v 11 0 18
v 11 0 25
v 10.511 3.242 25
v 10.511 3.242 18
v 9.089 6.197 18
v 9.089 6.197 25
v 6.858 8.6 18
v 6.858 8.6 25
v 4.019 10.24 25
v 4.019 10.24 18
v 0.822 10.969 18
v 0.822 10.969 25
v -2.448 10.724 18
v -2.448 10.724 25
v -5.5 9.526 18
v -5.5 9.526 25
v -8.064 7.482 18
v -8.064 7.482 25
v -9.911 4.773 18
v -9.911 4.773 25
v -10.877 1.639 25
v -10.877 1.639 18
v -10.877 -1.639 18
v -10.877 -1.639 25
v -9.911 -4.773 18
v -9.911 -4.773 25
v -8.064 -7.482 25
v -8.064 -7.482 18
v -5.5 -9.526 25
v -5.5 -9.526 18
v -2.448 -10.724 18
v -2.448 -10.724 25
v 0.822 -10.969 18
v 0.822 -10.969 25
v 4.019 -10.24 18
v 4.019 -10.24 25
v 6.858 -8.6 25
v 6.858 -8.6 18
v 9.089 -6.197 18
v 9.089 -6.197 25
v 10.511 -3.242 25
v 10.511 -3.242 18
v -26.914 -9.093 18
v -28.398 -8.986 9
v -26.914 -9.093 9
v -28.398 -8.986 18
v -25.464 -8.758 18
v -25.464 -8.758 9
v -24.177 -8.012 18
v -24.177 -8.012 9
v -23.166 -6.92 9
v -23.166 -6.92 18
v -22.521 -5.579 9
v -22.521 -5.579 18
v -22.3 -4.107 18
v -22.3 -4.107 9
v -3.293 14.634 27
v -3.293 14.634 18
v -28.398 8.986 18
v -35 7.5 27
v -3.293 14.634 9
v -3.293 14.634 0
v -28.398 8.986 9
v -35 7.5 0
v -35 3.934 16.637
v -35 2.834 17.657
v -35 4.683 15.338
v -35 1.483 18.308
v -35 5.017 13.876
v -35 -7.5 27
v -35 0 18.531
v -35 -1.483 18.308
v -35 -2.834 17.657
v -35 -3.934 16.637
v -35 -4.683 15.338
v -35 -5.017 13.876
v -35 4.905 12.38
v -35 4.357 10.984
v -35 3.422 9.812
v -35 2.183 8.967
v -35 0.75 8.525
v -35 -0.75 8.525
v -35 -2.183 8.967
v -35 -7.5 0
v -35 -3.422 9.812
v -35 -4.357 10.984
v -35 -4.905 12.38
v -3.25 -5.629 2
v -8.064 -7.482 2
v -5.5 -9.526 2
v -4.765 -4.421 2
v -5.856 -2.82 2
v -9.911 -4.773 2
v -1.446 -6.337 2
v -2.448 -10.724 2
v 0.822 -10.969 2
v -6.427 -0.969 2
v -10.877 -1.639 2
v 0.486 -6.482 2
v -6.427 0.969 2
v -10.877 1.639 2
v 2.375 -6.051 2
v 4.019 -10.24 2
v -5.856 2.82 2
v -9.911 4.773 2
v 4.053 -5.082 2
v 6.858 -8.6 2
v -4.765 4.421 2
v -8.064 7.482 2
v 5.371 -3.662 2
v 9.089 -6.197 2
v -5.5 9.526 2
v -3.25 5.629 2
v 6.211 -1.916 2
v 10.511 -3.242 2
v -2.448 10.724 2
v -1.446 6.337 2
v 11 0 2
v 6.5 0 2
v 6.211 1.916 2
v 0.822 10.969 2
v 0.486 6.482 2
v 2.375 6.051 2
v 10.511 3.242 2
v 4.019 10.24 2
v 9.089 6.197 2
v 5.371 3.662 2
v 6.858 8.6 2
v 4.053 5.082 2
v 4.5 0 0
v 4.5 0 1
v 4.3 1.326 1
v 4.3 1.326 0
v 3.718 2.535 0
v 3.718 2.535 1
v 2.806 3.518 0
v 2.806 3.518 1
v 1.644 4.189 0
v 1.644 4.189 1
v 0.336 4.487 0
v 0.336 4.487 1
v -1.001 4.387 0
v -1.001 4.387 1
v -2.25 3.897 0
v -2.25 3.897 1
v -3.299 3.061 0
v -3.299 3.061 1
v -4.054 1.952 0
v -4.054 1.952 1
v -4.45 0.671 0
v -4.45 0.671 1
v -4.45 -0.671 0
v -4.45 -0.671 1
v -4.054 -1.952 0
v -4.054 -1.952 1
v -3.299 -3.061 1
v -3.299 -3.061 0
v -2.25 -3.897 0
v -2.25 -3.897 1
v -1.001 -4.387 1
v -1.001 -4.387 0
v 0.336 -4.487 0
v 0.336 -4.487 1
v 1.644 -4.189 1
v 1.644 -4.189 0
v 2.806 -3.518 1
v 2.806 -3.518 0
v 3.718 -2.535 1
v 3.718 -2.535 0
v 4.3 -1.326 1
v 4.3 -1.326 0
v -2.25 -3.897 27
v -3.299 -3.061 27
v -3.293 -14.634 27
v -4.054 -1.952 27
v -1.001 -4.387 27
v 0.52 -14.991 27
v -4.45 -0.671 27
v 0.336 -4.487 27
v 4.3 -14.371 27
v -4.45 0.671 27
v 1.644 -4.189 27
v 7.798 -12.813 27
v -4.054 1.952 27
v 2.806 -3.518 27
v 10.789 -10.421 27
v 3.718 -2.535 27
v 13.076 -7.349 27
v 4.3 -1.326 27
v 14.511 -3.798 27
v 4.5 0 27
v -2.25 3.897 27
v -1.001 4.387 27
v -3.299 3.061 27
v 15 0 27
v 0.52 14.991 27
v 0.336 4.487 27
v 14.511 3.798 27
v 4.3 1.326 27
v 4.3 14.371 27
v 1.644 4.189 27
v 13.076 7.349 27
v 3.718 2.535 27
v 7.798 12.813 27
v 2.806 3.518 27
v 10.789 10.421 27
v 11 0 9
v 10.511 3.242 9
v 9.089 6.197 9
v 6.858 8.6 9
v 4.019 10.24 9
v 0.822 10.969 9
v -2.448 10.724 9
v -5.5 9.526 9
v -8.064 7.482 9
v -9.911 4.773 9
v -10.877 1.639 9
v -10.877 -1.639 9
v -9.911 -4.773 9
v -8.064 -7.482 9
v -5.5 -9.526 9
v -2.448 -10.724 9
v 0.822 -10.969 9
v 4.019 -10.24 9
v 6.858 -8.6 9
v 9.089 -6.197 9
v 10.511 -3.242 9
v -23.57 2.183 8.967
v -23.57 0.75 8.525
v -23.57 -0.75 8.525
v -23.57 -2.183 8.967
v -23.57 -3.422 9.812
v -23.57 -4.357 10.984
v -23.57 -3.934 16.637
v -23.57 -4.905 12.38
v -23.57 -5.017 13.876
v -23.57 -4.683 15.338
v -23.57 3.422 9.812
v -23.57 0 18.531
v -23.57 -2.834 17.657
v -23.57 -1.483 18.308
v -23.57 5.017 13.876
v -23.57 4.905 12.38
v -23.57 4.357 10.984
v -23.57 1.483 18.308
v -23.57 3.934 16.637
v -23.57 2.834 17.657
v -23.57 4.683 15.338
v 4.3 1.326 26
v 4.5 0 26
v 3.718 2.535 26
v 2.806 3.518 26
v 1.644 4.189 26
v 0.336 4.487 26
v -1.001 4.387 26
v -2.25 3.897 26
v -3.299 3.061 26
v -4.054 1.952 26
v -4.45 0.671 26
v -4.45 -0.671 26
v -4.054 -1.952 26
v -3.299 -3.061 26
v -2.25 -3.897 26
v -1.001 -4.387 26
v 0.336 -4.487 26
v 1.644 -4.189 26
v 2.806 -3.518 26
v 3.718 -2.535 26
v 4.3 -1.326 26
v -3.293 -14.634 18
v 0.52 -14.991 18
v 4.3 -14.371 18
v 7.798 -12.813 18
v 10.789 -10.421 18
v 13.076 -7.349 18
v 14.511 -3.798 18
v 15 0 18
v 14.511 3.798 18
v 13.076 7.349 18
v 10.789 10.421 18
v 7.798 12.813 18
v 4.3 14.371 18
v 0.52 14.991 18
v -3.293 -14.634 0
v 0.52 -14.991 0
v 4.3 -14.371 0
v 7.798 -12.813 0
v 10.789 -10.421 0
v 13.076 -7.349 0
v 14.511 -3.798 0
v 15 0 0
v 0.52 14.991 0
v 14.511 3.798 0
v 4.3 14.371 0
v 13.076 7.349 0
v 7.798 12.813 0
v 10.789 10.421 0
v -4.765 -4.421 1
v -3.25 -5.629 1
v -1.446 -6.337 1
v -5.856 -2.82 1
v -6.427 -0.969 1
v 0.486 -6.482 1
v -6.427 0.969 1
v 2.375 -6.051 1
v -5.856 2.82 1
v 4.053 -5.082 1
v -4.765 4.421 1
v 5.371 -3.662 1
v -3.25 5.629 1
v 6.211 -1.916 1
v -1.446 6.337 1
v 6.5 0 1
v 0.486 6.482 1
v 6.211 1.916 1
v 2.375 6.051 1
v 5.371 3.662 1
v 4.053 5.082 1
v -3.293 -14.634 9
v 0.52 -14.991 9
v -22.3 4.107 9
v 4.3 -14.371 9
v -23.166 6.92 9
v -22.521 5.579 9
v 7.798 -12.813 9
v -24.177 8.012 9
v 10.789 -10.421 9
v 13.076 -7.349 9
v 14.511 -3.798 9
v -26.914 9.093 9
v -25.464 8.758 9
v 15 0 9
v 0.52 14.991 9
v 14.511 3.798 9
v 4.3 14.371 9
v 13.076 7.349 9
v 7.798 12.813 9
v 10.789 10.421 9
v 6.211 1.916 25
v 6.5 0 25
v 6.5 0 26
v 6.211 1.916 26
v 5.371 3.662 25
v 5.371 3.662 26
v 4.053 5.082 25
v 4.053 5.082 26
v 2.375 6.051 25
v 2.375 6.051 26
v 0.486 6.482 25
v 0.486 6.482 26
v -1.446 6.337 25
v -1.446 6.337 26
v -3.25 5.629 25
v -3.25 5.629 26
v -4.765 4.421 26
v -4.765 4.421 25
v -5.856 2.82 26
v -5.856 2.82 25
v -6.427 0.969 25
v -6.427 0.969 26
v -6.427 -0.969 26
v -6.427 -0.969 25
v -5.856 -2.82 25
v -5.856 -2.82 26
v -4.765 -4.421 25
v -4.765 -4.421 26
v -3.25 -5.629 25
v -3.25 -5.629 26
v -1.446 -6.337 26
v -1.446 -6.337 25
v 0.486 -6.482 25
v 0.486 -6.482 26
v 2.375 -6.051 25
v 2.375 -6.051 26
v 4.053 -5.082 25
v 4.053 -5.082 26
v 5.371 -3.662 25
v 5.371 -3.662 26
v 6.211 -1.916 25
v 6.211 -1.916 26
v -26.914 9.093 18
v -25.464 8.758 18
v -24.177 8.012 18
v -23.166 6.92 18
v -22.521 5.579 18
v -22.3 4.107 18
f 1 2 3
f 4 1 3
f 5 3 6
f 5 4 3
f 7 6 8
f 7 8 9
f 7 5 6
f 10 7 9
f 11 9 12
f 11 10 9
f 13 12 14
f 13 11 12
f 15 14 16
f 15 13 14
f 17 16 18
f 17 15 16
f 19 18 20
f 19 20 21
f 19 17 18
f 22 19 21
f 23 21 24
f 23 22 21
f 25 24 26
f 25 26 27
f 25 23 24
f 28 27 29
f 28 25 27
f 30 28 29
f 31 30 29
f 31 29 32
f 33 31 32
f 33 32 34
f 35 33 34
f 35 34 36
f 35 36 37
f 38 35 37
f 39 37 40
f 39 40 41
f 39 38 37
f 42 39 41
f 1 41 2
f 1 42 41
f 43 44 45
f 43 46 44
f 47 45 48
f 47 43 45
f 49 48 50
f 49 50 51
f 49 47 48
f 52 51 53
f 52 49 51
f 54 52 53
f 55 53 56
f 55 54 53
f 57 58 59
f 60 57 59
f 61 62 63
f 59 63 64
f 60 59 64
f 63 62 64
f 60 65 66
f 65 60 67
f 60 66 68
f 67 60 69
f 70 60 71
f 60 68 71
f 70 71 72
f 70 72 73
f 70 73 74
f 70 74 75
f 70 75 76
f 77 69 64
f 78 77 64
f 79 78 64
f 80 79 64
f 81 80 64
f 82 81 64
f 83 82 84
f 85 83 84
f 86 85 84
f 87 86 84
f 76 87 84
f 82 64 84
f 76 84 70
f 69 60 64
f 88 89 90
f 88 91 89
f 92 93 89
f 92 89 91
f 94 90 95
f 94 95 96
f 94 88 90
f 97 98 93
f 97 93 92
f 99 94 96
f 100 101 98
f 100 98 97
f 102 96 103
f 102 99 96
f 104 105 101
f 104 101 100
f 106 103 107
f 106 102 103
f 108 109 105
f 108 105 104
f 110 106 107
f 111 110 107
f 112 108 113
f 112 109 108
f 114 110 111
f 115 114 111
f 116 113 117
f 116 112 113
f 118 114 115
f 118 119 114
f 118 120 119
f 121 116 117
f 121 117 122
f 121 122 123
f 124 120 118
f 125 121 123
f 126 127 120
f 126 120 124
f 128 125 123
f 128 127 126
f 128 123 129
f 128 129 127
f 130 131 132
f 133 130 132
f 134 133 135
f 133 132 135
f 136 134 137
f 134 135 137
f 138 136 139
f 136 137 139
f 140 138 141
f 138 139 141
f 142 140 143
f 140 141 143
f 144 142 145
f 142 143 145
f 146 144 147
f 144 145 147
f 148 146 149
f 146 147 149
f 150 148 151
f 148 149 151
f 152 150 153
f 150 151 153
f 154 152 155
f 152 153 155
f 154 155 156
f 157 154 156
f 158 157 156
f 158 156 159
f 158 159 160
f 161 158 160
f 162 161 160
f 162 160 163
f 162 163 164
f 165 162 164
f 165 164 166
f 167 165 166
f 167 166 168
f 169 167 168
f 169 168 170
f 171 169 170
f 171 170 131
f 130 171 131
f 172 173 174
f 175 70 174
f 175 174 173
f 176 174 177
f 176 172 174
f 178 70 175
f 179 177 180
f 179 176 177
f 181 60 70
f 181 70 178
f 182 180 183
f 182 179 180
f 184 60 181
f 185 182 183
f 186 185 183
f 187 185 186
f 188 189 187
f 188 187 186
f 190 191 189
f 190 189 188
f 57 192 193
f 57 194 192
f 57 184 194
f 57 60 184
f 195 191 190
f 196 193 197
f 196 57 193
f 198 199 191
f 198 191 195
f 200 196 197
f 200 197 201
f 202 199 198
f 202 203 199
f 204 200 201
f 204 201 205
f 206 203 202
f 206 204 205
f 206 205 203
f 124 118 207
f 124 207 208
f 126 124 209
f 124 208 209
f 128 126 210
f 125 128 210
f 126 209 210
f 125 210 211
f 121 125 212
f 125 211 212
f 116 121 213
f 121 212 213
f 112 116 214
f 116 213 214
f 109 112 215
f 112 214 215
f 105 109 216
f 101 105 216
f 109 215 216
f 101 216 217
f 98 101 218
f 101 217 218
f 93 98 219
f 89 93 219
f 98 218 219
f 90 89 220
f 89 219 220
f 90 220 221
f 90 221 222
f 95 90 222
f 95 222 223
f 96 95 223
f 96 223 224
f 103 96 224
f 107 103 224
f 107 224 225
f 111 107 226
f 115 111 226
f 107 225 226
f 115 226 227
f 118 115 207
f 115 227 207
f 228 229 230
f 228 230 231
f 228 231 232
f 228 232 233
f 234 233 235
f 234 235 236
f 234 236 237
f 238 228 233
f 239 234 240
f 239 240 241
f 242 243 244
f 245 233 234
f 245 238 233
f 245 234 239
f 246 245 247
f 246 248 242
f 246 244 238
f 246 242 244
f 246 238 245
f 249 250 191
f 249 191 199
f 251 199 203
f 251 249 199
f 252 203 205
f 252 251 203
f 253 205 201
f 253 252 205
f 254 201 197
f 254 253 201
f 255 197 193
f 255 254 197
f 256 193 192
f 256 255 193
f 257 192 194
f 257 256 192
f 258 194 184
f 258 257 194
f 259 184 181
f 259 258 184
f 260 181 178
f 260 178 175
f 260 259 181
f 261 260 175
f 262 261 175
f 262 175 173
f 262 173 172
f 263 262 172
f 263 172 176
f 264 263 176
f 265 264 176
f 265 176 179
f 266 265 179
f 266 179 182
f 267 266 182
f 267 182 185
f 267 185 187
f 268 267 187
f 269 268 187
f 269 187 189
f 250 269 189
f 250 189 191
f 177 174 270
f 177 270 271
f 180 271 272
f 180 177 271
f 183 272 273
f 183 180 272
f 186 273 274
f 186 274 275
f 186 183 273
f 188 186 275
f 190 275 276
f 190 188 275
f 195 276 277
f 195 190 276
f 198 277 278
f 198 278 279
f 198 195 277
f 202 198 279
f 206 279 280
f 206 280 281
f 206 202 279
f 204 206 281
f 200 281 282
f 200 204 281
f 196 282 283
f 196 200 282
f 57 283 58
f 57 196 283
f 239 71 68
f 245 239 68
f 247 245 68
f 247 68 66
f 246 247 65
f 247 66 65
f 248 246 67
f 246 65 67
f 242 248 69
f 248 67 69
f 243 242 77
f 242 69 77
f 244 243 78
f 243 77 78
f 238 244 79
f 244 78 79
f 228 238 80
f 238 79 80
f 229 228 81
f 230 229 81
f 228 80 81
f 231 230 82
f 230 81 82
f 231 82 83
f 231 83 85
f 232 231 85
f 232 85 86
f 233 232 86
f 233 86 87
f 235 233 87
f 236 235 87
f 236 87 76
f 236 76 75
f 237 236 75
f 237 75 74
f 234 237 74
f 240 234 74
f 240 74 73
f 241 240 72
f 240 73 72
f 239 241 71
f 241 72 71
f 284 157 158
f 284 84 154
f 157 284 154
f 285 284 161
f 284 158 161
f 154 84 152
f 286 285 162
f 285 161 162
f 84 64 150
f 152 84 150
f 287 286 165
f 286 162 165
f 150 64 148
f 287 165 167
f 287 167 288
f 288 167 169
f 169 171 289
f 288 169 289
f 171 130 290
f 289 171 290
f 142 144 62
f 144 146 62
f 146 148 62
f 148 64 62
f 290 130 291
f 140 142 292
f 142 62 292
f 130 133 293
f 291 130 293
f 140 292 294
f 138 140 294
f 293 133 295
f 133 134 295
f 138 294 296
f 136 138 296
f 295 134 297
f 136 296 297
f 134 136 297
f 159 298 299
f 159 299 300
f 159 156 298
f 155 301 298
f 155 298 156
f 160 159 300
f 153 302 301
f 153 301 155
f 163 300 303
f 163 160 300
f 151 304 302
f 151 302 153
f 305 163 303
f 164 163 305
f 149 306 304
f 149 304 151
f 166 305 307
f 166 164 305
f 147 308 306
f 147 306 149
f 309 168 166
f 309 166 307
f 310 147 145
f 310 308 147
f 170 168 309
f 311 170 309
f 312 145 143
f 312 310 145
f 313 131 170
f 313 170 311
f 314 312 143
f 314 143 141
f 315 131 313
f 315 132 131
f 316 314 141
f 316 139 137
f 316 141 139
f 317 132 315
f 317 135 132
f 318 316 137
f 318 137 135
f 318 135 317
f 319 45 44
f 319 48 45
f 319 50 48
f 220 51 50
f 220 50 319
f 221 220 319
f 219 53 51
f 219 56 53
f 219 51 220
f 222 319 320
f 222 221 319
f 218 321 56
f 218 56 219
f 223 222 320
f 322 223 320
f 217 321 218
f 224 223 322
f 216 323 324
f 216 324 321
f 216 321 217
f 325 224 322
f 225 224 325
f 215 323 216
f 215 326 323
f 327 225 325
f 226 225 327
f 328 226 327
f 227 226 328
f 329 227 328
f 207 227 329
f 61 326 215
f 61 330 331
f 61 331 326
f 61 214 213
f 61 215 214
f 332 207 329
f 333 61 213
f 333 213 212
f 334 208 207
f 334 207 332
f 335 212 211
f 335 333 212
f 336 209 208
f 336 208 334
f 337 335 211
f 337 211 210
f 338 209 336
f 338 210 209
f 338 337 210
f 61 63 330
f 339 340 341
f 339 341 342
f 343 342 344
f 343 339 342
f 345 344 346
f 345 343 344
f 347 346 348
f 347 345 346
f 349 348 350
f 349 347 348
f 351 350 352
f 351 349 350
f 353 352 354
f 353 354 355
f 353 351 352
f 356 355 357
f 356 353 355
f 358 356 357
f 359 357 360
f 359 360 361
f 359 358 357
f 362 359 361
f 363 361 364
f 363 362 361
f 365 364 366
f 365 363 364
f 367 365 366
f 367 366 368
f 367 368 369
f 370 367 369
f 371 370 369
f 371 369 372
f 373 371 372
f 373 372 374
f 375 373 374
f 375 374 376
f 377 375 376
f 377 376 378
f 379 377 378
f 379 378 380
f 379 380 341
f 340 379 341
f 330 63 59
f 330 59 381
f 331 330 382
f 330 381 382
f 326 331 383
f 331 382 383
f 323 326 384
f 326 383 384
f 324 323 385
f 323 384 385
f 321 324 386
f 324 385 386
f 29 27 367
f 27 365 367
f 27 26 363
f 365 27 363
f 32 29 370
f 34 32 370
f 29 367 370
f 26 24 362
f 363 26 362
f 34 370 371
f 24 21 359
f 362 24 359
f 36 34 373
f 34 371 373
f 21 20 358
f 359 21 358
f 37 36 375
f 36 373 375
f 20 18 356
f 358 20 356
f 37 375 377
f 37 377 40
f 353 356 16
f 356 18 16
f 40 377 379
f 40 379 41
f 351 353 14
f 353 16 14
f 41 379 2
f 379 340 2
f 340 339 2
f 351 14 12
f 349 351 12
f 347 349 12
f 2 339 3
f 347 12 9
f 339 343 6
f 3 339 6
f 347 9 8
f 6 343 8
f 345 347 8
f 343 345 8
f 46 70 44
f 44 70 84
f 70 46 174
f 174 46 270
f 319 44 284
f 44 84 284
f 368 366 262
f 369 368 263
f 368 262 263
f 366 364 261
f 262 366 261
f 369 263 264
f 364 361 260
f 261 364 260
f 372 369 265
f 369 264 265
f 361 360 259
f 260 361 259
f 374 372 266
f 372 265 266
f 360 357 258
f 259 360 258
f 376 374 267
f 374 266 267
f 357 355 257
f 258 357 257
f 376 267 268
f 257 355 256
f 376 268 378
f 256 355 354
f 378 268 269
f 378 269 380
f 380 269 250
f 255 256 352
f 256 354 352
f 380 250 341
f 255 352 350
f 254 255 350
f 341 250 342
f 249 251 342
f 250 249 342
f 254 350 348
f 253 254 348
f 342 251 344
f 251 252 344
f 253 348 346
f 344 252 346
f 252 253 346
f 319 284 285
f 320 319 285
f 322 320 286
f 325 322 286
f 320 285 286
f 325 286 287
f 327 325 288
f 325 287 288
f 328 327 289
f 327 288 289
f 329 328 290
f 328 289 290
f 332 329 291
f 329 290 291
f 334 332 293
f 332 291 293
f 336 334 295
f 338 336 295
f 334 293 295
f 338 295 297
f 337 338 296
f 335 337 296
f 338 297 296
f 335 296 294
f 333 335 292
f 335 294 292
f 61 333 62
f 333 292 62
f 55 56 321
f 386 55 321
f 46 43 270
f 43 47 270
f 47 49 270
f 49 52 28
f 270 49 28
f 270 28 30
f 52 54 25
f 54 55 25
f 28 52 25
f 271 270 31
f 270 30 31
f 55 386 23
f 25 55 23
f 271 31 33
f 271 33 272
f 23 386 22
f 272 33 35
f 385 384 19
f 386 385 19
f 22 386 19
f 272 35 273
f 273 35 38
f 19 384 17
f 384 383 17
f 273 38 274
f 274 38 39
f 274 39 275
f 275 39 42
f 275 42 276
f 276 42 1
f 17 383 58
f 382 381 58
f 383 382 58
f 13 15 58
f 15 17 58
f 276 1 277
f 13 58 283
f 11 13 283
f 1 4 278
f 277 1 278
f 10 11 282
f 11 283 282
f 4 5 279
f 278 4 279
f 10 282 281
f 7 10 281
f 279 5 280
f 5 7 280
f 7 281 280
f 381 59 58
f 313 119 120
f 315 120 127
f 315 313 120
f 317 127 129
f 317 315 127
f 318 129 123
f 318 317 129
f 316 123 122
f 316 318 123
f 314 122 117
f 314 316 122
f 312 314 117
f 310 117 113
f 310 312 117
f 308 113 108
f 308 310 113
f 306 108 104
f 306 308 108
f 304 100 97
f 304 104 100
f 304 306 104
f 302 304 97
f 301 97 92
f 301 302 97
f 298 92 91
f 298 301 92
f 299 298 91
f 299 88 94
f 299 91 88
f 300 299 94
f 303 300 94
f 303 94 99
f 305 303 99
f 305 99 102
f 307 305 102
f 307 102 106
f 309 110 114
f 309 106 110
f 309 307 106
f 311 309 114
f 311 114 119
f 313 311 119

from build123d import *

# Parameters (mm, degrees)
SKETCH1_R               = 15
BOSS_EXTRUDE1_DEPTH     = 9
SKETCH2_R               = 11
CUT_EXTRUDE1_DEPTH      = 7
CUT_EXTRUDE2_REACH      = 40.717
SKETCH3_R               = 4.5
BOSS_EXTRUDE3_REACH     = 44.119
SKETCH6_R               = 5.031250000000002
CUT_EXTRUDE3_DEPTH      = 11.43
FILLET1_R               = 5
CUT_EXTRUDE4_DEPTH      = 1
CUT_EXTRUDE4_DEPTH_BACK = 24
SKETCH7_R               = 6.5


with BuildPart() as part:
    # Sketch1 → Boss-Extrude1 (new body)
    with BuildSketch(Plane.XY):
        with BuildLine():
            ThreePointArc((-3.2926829268292646, -14.634146341463415), (-15, 1.84e-15), (-3.2926829268292708, 14.634146341463413))
            Line((-3.2926829268292703, 14.634146341463419), (-35.00000000000001, 7.499999999999995))
            Line((-35.00000000000001, 7.499999999999995), (-35, -7.500000000000005))
            Line((-35, -7.500000000000005), (-3.292682926829265, -14.634146341463415))
        make_face()
        Circle(SKETCH1_R)
    extrude(amount=BOSS_EXTRUDE1_DEPTH)

    # Sketch2 → Cut-Extrude1 (cut)
    with BuildSketch(Plane.XY.offset(9)):
        Circle(SKETCH2_R)
    extrude(amount=-CUT_EXTRUDE1_DEPTH, mode=Mode.SUBTRACT)

    # Sketch3 → Cut-Extrude2 (cut, up to next)
    with BuildSketch(Plane.XY.offset(2), mode=Mode.PRIVATE) as cut_extrude2_sk1:
        Circle(SKETCH3_R)
    cut_extrude2_tool1 = extrude(cut_extrude2_sk1.sketch, amount=-CUT_EXTRUDE2_REACH, mode=Mode.PRIVATE) & part.part
    add(cut_extrude2_tool1.solids().sort_by_distance((0, 0, 2))[0], mode=Mode.SUBTRACT)


with BuildPart() as body_2:
    # Mirror8: mirrored copy
    add(part.part.mirror(Plane.XY.offset(13.499999999999998)))

    # Sketch4 → Boss-Extrude3 (add, up to next)
    with BuildSketch(Plane.XY.offset(9), mode=Mode.PRIVATE) as boss_extrude3_sk1:
        Polygon((-35.00000000000001, 7.499999999999995), (-35.00000000000001, -7.500000000000005), (-22.300000000000008, -10.357500000000002), (-22.300000000000015, 10.357499999999998), align=None)
    boss_extrude3_tool1 = extrude(boss_extrude3_sk1.sketch, amount=BOSS_EXTRUDE3_REACH, mode=Mode.PRIVATE) - body_2.part

    add(part.part)  # Boss-Extrude3 merges part
    add(boss_extrude3_tool1.solids().sort_by_distance((-28.311298, 0, 9))[0])

    # Sketch6 → Cut-Extrude3 (cut)
    with BuildSketch(Plane.ZY.offset(35.00000000000001)):
        with Locations((13.499999999999998, -3.47e-15)):
            Circle(SKETCH6_R)
    extrude(amount=-CUT_EXTRUDE3_DEPTH, mode=Mode.SUBTRACT)

    # Fillet1
    fillet1_edges = [body_2.edges().sort_by_distance(p)[0] for p in [
        (-22.300000000000015, 10.357499999999996, 13.499999999999998),
        (-22.300000000000008, -10.3575, 13.499999999999998),
    ]]
    fillet(fillet1_edges, radius=FILLET1_R)

    # Sketch7 → Cut-Extrude4 (cut, two sides: drawn at the far end of the back side and taken through both)
    with BuildSketch(Plane.XY.offset(24.999999999999993).offset(-CUT_EXTRUDE4_DEPTH_BACK)):
        Circle(SKETCH7_R)
    extrude(amount=CUT_EXTRUDE4_DEPTH + CUT_EXTRUDE4_DEPTH_BACK, mode=Mode.SUBTRACT)


solid = body_2.part
